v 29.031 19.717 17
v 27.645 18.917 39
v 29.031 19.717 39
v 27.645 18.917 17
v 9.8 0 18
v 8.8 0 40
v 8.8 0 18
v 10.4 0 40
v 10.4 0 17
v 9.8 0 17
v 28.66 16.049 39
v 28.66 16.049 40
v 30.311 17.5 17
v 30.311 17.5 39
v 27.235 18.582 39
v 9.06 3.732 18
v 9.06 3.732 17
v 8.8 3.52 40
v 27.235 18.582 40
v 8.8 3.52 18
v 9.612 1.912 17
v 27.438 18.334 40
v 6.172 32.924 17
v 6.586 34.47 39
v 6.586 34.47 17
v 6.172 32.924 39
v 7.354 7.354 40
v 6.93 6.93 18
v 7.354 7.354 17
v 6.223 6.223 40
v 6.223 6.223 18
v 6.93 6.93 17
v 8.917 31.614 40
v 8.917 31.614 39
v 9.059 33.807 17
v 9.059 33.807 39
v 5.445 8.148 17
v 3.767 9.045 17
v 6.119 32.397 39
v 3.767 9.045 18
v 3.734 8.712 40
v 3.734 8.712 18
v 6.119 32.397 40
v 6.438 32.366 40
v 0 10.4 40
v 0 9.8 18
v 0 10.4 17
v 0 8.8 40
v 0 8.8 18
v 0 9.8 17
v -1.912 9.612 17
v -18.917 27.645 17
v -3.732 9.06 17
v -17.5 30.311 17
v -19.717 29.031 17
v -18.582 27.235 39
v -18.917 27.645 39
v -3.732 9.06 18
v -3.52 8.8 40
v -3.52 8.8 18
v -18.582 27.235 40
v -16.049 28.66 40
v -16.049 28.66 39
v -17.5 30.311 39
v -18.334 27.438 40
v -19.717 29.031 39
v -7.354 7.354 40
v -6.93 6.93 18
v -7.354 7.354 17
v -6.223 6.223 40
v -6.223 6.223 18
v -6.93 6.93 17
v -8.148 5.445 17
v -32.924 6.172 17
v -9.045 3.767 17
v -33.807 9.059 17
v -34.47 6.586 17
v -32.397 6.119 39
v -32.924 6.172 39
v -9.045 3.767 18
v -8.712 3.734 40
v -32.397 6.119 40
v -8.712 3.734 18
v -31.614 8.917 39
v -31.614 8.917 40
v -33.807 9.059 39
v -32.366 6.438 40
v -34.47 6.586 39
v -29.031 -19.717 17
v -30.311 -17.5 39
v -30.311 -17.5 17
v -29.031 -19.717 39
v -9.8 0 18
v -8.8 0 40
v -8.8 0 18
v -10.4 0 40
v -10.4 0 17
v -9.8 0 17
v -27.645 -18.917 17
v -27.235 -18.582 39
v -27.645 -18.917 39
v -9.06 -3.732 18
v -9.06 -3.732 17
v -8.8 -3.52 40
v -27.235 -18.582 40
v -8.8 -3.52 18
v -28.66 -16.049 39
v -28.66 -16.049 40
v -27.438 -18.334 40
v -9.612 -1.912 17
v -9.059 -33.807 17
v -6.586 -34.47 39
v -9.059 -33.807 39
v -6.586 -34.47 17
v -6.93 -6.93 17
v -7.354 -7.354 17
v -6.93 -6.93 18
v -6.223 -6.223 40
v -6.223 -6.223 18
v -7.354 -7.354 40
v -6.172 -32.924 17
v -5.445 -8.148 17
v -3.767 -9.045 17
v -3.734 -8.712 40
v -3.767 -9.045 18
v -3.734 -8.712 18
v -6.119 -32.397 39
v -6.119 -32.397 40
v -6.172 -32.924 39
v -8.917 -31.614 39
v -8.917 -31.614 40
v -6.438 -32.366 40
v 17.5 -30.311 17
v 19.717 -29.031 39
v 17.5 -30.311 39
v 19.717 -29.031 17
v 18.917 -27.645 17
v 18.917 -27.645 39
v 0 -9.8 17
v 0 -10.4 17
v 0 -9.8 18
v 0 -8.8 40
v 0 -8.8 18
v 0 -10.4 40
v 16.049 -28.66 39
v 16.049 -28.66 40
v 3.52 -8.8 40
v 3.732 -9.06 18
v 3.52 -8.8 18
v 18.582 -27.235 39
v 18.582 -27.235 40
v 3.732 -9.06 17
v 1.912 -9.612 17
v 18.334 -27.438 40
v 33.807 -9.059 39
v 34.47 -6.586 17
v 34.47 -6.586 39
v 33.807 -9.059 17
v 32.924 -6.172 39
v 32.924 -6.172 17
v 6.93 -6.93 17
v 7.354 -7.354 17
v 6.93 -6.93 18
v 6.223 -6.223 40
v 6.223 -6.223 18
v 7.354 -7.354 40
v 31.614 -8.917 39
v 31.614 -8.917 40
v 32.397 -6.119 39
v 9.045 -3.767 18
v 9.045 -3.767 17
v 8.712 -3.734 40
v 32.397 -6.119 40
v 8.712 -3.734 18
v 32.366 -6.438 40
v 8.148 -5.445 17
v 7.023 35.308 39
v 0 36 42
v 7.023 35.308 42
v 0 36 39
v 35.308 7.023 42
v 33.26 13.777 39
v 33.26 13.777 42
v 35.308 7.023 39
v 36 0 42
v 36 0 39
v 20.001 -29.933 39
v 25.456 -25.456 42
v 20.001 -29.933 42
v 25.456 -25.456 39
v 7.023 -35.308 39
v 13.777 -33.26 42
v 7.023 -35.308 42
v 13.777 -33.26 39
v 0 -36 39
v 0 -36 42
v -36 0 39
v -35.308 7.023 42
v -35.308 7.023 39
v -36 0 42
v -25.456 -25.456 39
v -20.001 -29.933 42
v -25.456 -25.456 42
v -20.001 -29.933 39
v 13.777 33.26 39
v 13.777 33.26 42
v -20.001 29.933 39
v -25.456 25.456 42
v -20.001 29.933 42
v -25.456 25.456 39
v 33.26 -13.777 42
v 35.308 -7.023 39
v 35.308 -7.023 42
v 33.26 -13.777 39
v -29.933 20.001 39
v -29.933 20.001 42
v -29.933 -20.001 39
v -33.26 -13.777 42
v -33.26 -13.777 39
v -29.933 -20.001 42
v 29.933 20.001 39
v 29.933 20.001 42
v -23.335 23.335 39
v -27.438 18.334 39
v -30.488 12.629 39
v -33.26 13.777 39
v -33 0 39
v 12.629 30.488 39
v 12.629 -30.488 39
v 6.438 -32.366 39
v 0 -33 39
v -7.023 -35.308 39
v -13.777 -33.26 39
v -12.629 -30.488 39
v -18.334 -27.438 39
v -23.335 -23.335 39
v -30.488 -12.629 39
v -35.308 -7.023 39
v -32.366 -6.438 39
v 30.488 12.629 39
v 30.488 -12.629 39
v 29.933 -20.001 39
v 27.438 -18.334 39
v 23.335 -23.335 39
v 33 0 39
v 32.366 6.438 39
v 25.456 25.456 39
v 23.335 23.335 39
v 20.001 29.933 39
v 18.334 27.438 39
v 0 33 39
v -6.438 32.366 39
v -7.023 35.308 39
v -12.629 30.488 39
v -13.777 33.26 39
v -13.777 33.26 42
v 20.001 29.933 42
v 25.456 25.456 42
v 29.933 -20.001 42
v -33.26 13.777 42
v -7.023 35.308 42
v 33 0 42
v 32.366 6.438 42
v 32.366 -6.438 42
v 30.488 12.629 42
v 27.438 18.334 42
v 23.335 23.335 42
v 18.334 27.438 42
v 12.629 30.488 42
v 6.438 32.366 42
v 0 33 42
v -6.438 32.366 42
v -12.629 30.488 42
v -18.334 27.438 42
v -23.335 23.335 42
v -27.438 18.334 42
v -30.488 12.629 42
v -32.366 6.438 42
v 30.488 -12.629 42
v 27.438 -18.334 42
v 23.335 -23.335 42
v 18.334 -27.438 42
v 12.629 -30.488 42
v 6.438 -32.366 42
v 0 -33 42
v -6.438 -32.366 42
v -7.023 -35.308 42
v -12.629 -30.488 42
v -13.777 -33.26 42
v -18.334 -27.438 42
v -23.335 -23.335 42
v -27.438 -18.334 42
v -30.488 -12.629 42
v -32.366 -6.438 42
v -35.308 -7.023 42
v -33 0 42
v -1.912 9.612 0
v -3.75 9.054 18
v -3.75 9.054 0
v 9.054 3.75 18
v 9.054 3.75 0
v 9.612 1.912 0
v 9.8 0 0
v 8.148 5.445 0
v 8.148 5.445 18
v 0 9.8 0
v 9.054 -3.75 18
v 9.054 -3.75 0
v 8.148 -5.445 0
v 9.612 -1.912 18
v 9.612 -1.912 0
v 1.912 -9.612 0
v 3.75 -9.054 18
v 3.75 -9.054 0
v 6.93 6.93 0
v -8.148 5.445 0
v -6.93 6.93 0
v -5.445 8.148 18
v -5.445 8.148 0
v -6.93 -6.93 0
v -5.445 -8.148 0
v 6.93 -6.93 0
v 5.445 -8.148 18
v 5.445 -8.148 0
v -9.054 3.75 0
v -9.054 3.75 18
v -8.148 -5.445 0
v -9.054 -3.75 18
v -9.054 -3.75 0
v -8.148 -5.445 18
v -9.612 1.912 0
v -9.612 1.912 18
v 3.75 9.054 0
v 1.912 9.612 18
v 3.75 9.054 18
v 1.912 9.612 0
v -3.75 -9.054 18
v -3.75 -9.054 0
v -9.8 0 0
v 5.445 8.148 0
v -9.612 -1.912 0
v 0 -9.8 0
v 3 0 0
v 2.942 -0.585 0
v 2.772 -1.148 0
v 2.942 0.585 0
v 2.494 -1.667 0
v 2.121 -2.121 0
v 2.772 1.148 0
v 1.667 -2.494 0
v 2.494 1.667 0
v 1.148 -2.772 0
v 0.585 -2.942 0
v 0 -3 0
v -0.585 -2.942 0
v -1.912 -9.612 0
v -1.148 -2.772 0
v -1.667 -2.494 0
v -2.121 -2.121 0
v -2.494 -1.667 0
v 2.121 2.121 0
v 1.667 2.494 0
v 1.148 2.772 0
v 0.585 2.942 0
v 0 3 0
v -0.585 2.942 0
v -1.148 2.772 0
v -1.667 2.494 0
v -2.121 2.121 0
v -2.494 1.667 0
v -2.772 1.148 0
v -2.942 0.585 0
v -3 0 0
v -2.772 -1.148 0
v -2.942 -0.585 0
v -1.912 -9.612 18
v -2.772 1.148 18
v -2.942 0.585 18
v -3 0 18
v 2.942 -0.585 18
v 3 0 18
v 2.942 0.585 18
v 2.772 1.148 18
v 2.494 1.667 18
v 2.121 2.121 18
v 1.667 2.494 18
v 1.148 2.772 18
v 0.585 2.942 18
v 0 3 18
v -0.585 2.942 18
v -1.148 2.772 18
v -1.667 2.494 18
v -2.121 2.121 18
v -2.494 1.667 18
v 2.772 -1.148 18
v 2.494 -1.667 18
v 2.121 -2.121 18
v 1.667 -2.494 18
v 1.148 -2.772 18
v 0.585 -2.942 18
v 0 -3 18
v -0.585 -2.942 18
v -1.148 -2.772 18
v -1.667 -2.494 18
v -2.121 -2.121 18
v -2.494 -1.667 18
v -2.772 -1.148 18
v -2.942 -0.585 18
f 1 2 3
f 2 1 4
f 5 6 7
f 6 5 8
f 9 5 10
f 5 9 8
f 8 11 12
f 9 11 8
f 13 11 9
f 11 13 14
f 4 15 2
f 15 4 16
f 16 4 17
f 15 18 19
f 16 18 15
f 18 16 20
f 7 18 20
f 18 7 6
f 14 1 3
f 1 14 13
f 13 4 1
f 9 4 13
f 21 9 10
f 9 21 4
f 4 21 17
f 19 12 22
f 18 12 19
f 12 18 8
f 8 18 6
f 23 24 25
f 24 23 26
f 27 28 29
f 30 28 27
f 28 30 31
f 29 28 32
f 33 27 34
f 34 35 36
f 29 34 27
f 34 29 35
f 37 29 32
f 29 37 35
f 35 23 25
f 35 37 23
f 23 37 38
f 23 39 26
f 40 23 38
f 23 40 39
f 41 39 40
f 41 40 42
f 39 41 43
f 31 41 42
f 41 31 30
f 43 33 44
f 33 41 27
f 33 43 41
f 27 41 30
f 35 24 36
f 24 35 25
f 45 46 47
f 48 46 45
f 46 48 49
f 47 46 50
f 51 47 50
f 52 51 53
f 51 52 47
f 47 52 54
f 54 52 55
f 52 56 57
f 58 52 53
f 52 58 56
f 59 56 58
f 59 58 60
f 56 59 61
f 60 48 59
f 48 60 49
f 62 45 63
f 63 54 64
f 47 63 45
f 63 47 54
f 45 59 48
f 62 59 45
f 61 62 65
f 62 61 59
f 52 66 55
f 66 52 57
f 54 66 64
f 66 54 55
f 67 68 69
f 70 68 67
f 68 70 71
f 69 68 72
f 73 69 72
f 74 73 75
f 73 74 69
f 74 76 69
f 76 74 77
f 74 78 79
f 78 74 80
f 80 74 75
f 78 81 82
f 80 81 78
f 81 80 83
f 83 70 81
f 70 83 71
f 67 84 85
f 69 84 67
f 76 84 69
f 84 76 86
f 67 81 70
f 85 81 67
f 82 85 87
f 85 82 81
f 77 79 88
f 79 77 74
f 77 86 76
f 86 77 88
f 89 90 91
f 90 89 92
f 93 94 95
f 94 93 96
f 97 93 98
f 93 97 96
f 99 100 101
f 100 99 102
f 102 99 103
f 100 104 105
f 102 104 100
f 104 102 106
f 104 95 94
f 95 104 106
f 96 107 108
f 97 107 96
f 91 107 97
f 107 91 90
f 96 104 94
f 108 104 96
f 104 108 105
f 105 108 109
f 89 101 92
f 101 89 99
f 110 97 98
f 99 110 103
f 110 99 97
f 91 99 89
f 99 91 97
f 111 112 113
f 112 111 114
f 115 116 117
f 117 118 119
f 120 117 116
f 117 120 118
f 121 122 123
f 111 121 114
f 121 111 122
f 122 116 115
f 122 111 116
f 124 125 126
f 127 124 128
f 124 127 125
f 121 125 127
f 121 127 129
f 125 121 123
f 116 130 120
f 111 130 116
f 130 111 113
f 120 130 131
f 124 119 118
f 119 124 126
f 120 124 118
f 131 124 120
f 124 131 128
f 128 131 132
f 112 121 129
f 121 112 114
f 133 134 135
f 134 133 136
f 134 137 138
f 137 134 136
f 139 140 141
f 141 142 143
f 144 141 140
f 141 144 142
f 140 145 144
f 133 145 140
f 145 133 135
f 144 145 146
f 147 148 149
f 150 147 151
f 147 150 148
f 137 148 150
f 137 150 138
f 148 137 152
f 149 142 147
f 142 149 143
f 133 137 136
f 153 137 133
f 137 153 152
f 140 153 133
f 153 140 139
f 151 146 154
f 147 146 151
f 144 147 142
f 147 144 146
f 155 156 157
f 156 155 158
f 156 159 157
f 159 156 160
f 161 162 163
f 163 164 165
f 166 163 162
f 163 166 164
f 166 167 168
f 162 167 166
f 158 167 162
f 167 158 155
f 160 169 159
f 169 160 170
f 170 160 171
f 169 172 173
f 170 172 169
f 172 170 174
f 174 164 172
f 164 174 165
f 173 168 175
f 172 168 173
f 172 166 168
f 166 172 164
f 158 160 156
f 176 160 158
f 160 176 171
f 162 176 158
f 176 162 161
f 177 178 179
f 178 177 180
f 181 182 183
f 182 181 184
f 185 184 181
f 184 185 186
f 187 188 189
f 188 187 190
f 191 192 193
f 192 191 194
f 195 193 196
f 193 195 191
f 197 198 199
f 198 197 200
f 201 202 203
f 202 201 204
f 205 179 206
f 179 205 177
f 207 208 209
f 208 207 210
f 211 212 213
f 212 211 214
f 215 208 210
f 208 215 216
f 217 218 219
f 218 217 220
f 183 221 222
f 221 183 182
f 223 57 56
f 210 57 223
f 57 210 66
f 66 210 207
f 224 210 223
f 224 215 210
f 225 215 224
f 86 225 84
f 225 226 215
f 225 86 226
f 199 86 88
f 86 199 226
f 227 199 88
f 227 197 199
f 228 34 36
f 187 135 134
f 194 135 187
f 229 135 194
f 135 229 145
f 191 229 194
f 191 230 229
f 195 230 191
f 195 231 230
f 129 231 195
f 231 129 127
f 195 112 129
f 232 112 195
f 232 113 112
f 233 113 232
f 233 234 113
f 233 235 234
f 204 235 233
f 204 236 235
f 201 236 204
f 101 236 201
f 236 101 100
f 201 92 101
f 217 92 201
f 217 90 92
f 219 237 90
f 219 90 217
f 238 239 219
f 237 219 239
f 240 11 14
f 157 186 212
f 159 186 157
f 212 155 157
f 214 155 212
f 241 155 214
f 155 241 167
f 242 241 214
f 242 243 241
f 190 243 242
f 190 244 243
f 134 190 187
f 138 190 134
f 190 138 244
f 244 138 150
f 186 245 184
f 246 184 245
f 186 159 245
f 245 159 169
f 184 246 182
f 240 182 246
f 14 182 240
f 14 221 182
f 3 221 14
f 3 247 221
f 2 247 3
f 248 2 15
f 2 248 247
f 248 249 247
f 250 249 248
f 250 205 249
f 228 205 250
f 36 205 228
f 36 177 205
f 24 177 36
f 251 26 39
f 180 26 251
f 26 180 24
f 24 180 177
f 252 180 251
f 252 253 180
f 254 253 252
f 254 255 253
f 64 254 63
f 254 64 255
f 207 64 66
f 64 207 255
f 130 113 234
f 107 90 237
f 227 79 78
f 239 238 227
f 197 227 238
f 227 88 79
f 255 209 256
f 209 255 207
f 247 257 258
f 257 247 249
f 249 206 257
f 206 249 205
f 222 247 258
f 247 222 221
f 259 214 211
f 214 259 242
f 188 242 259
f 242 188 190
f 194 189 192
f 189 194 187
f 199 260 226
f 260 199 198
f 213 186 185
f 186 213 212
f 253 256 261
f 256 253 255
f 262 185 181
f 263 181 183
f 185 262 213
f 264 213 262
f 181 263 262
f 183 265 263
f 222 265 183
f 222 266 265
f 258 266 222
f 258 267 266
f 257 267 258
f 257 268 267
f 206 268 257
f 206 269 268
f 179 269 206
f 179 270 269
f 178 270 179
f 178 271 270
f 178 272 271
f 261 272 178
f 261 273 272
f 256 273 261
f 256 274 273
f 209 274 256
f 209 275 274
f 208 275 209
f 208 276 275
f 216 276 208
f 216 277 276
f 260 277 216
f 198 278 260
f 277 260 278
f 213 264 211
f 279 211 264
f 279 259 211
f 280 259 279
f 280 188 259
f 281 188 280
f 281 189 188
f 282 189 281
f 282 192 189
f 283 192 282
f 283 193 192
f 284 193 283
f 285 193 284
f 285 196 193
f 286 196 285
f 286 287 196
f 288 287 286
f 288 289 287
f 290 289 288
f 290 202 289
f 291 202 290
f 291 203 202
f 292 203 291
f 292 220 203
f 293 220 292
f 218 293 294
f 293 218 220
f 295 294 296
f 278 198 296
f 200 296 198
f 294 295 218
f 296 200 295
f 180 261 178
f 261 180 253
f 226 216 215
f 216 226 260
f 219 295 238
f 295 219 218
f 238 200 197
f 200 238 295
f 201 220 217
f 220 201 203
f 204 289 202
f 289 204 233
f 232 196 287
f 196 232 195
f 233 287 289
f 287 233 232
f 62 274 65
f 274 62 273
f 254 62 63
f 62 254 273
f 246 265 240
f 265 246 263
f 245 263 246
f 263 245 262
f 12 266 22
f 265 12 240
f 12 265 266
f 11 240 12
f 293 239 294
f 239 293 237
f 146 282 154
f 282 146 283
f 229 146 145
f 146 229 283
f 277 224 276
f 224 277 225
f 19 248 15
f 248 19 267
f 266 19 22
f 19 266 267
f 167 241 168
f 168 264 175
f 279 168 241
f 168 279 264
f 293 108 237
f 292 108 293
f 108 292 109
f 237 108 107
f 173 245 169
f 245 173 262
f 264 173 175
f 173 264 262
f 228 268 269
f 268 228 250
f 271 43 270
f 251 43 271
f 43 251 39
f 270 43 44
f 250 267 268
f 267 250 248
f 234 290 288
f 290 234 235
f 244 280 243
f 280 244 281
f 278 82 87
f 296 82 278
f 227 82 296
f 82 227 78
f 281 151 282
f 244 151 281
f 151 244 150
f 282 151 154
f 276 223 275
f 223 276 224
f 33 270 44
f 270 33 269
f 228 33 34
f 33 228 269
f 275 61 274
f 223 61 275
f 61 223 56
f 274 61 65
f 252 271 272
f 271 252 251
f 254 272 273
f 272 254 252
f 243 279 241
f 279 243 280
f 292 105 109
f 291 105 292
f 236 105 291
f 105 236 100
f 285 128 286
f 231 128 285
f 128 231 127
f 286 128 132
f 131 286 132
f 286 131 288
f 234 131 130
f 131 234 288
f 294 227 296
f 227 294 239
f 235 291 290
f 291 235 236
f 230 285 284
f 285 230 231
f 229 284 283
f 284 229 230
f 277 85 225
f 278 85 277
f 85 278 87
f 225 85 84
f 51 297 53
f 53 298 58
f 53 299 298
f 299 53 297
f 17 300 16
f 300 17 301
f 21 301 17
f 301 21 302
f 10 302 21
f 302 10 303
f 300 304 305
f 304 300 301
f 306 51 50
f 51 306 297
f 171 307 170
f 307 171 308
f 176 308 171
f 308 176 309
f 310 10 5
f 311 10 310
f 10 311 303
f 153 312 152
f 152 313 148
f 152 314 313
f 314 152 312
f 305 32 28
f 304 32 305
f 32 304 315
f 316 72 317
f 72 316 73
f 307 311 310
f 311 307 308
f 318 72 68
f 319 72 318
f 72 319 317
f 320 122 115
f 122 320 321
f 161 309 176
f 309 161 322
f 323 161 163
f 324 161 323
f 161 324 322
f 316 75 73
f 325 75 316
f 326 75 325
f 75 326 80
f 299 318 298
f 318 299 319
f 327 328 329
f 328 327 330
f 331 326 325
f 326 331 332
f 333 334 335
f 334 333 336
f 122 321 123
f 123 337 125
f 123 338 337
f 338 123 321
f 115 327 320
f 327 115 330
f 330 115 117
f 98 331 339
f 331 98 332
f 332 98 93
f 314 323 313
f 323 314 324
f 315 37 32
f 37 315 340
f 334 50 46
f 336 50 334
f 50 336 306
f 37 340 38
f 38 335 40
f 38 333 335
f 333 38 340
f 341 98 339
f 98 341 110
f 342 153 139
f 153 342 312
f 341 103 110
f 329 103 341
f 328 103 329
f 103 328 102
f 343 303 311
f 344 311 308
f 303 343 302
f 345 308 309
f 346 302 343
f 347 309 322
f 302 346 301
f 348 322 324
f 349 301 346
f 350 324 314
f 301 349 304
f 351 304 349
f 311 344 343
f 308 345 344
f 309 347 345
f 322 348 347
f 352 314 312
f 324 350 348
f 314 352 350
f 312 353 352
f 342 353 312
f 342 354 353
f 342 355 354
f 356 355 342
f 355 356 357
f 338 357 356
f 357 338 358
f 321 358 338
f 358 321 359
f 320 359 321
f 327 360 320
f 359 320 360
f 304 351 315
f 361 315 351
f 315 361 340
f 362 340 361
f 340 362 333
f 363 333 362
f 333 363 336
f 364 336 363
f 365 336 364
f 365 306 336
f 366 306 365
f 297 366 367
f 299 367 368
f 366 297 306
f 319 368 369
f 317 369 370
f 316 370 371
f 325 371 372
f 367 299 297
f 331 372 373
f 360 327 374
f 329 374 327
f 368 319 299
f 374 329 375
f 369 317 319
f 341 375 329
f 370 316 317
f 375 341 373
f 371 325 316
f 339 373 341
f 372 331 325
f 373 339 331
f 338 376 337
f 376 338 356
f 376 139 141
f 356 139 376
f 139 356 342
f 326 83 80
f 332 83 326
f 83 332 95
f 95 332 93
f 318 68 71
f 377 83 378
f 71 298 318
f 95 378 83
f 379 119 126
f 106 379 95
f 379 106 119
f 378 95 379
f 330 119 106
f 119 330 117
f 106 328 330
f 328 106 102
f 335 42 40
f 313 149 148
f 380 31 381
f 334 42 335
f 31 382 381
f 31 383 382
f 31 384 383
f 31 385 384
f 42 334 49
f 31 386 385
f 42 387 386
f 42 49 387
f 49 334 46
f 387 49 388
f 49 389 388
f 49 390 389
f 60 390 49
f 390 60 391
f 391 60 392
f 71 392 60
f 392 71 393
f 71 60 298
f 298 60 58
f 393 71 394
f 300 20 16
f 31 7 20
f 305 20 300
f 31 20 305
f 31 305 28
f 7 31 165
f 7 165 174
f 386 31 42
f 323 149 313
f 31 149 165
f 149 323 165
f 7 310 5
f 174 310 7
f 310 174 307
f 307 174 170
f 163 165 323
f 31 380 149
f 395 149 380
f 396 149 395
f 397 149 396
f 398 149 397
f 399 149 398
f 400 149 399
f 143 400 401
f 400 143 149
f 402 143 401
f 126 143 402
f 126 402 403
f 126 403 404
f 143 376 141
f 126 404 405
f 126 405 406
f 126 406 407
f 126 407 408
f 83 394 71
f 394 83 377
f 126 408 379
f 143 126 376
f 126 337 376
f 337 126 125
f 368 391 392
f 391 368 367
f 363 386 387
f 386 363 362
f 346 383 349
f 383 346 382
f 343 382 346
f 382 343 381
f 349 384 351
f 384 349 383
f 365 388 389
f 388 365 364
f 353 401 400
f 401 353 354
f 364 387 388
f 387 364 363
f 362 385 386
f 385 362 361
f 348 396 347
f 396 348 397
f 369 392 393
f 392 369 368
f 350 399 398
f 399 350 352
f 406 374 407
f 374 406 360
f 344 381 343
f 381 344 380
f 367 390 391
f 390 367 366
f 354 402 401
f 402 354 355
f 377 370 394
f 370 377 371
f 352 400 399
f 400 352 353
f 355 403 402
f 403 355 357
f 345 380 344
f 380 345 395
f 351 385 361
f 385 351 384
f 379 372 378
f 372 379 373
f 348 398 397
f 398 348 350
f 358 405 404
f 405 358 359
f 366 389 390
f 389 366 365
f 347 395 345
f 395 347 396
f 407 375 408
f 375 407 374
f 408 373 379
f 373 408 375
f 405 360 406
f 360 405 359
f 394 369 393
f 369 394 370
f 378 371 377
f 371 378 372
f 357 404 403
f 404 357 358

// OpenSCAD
$fn = 32;

// ----------------------------------------------------------------------
// Impeller: 70 mm, 8 blades, 42 mm tall
// ----------------------------------------------------------------------

// --- parameters (mm) ---
boss_d = 19.6;            // hub diameter
boss_h = 18;              // hub height
rotor_d = 70;             // outer diameter over the blades
vane_count = 8;           // number of blades
blade_t = 1.6;            // blade thickness
blade_h = 22;             // blade height
blade_in_r = 8.8;         // blade root radius
blade_out_r = 33.4;       // blade tip radius
sweep = 30;               // blade sweep, degrees
bore_d = 6;               // shaft bore
shroud_h = 2;             // shroud ring thickness
shroud_d = 72;            // shroud outside diameter

module hub() {
  cylinder(h = boss_h, d = boss_d);
}

module blade() {
  /* blade swept between two boxes: hull of the root and the tip section */
  hull() {
    translate([blade_in_r, 0, boss_h - 1])
      cube([blade_t, blade_t * 2.2, blade_h + 1], center = false);
    rotate([0, 0, sweep])
      translate([blade_out_r, 0, boss_h - 1])
        cube([blade_t, blade_t * 1.6, blade_h + 1], center = false);
  }
}

module blades() {
  for (i = [0 : vane_count - 1])
    rotate([0, 0, i * 360 / vane_count]) blade();
}

module shroud() {
  translate([0, 0, boss_h + blade_h - 1])
    difference() {
      cylinder(h = shroud_h + 1, d = shroud_d);
      translate([0, 0, -1]) cylinder(h = shroud_h + 3, d = shroud_d - 2 * 3);
    }
}

difference() {
  union() {
    hub();
    blades();
    shroud();
  }
  translate([0, 0, -1]) cylinder(h = boss_h + blade_h + shroud_h + 3, d = bore_d);
}
